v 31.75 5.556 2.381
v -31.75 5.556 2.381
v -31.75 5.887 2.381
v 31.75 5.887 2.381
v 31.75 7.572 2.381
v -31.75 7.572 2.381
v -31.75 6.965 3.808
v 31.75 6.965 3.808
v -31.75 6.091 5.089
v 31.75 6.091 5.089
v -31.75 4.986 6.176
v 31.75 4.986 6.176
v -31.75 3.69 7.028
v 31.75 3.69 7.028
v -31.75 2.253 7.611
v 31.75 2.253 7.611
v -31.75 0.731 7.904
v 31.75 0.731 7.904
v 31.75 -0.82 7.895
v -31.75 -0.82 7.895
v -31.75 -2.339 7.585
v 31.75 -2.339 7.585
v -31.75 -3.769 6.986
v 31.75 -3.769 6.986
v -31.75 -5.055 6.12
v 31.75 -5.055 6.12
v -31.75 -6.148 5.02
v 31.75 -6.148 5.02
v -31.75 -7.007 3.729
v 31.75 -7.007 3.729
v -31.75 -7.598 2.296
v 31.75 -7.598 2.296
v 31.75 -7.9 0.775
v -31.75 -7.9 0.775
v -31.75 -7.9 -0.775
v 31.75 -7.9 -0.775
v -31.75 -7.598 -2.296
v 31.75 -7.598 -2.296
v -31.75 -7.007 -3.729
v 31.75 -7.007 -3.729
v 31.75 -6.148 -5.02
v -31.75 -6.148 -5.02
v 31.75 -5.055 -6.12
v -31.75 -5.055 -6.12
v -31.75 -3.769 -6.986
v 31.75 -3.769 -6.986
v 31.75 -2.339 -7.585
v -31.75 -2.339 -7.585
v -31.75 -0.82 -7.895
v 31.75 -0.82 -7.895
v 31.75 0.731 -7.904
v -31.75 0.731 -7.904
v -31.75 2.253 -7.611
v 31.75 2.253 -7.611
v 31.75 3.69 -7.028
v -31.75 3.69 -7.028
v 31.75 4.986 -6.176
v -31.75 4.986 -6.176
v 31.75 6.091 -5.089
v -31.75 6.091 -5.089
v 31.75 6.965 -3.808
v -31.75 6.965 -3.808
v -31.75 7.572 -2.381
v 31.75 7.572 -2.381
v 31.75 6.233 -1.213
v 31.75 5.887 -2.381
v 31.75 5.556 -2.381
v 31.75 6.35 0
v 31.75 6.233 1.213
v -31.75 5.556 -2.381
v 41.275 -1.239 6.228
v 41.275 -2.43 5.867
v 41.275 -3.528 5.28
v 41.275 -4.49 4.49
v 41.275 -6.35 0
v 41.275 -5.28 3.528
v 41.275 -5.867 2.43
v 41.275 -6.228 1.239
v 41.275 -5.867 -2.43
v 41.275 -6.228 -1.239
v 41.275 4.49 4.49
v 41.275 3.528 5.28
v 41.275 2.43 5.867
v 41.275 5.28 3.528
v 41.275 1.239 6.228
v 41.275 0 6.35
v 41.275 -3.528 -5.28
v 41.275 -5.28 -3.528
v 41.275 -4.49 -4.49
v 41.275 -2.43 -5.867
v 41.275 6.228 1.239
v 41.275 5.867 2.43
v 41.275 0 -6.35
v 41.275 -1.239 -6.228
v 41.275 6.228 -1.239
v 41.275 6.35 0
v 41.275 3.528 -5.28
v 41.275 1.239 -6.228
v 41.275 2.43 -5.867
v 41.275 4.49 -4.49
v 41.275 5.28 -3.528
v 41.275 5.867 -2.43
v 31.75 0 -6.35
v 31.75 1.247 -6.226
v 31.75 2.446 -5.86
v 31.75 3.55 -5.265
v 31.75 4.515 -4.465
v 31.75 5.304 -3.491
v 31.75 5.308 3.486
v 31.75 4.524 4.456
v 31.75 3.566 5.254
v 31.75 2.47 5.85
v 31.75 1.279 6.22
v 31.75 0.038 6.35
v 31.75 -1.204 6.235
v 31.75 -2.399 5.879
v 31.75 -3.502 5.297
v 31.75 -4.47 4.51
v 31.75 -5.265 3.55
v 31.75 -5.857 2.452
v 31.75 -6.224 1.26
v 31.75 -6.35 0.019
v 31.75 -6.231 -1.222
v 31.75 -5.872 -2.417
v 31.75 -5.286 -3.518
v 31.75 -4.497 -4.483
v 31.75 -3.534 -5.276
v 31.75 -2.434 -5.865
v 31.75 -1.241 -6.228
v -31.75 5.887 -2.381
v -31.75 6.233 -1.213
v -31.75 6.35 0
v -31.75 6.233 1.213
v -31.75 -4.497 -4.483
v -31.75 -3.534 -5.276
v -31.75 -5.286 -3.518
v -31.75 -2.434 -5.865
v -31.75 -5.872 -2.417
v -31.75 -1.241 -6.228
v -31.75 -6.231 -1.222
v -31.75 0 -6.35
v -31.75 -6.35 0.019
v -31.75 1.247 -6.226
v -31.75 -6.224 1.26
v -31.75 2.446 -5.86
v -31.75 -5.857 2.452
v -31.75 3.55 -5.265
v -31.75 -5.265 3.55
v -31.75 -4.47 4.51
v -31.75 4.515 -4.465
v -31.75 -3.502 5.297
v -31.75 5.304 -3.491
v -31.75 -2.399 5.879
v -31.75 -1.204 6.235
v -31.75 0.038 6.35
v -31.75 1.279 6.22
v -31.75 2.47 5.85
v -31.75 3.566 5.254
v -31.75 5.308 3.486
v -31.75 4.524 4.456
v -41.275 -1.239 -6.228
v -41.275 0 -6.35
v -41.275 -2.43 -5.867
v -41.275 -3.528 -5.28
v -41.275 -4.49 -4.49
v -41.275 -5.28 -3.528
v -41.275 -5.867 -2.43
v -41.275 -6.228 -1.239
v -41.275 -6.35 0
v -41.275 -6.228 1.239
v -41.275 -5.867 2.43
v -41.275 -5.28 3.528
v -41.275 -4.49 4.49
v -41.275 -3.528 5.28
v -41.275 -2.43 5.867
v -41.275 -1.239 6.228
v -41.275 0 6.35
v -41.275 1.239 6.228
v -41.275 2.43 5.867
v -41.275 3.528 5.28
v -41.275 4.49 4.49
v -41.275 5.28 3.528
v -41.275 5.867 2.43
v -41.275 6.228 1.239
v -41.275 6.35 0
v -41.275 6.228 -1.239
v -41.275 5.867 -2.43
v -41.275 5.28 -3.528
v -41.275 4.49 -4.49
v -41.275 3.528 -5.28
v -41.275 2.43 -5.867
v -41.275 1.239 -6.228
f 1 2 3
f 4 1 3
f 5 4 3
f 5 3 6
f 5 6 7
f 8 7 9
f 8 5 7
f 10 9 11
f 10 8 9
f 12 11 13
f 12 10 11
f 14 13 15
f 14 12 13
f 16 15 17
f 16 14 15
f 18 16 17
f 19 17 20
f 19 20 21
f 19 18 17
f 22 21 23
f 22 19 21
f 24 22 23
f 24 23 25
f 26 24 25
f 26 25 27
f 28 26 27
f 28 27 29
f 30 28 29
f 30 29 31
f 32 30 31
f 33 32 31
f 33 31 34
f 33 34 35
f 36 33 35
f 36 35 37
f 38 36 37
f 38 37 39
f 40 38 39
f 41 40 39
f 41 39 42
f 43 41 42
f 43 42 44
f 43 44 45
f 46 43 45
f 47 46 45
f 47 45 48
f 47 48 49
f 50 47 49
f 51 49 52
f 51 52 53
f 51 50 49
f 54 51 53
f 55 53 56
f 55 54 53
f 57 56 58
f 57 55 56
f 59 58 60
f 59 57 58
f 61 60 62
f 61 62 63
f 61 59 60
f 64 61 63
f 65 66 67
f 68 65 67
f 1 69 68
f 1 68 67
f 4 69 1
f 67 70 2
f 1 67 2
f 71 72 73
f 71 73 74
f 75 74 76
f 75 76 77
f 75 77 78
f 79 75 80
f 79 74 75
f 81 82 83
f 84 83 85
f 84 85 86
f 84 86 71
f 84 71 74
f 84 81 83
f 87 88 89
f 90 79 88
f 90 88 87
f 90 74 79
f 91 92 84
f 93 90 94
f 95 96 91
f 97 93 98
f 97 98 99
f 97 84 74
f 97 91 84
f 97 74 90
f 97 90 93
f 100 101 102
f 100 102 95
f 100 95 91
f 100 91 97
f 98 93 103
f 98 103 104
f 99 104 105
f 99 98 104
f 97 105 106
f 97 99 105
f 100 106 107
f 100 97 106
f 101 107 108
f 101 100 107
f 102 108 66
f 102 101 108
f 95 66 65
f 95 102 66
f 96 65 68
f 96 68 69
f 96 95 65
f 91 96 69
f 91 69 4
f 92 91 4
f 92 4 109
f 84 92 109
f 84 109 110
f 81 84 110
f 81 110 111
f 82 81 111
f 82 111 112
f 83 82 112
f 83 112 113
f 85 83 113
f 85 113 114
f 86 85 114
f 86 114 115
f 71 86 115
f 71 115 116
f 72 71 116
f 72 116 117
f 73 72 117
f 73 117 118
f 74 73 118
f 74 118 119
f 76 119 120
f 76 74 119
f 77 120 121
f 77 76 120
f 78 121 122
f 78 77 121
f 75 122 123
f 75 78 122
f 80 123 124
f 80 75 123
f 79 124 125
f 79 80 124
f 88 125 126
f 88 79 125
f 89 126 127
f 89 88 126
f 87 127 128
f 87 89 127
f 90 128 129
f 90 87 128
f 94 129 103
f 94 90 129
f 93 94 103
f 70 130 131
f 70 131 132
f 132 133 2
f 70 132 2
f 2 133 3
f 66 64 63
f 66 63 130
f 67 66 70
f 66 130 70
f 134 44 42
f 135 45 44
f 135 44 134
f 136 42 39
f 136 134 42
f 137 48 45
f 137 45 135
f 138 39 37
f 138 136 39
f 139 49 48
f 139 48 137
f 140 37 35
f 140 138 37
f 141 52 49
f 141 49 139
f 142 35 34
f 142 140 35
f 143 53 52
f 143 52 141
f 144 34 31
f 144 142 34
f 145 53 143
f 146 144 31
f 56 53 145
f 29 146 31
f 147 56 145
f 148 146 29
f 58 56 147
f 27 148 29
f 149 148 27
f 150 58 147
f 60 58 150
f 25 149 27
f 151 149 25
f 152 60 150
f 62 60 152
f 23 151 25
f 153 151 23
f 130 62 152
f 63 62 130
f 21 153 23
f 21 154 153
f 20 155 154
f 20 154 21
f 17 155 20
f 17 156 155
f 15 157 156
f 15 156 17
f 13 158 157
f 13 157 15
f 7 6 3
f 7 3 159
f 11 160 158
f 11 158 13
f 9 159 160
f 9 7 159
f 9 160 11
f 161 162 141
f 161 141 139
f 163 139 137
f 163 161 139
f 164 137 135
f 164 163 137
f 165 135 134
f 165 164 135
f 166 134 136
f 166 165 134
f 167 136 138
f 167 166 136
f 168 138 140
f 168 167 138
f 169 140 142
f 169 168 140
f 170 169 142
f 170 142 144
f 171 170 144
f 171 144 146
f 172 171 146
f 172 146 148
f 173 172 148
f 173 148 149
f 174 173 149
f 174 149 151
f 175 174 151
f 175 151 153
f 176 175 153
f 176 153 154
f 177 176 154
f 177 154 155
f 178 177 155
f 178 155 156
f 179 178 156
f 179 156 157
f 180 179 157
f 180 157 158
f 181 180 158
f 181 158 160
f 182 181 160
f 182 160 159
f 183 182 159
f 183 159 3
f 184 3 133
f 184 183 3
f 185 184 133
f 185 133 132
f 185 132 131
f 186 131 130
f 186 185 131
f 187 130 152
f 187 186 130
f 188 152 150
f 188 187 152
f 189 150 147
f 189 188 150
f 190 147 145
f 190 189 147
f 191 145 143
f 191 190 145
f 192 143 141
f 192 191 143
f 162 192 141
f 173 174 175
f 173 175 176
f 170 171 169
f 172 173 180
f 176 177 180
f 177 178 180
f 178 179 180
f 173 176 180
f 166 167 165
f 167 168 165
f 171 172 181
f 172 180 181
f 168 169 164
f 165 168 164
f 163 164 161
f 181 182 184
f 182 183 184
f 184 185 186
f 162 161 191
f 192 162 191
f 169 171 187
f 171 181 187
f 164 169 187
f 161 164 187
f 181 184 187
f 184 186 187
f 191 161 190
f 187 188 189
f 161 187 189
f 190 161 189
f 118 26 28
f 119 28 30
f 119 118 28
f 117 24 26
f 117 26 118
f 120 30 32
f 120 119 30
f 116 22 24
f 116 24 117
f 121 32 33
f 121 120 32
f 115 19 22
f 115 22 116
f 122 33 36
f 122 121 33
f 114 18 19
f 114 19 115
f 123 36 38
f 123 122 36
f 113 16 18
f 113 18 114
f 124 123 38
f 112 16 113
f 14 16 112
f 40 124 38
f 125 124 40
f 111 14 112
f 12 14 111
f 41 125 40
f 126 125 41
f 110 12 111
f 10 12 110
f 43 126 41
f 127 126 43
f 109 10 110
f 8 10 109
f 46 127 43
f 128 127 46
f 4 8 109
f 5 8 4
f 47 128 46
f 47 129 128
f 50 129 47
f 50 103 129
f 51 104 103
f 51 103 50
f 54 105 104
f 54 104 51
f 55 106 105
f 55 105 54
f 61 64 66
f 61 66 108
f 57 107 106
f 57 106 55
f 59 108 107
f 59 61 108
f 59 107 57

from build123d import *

# Parameters (mm, degrees)
SKETCH1_R           = 7.9375
BOSS_EXTRUDE1_DEPTH = 41.275
SKETCH4_OUTSIDE_W   = 34.984
SKETCH4_OUTSIDE_H   = 34.984
SKETCH4_OUTSIDE_R   = 6.35
CUT_EXTRUDE1_DEPTH  = 9.525
SKETCH5_OUTSIDE_W   = 34.984
SKETCH5_OUTSIDE_H   = 34.984
SKETCH5_OUTSIDE_R   = 6.35
CUT_EXTRUDE2_DEPTH  = 9.525
CUT_EXTRUDE3_DEPTH  = 63.5


with BuildPart() as part:
    # Sketch1 → Boss-Extrude1 (new body, symmetric)
    with BuildSketch(Plane(origin=(0, 0, 0), x_dir=(0, 0, -1), z_dir=(1, 0, 0))):
        Circle(SKETCH1_R)
    extrude(amount=BOSS_EXTRUDE1_DEPTH, both=True)

    # Sketch4 outside → Cut-Extrude1 (cut)
    with BuildSketch(Plane(origin=(41.275, 0, 0), x_dir=(0, 0, -1), z_dir=(1, 0, 0))):
        Rectangle(SKETCH4_OUTSIDE_W, SKETCH4_OUTSIDE_H)
        Circle(SKETCH4_OUTSIDE_R, mode=Mode.SUBTRACT)
    extrude(amount=-CUT_EXTRUDE1_DEPTH, mode=Mode.SUBTRACT)

    # Sketch5 outside → Cut-Extrude2 (cut)
    with BuildSketch(Plane.ZY.offset(41.275)):
        Rectangle(SKETCH5_OUTSIDE_W, SKETCH5_OUTSIDE_H)
        with Locations(Location((0, 0, 0), (0, 0, 180))):  # turned: the seam where the file's is
            Circle(SKETCH5_OUTSIDE_R, mode=Mode.SUBTRACT)
    extrude(amount=-CUT_EXTRUDE2_DEPTH, mode=Mode.SUBTRACT)

    # Sketch7 → Cut-Extrude3 (cut)
    with BuildSketch(Plane.ZY.offset(31.75)):
        with BuildLine():
            Line((0, 5.55625), (2.38125, 5.55625))
            Line((2.38125, 5.55625), (2.38125, 7.571892411))
            ThreePointArc((2.38125, 7.571892411), (0, 7.9375), (-2.38125, 7.571892411))
            Line((-2.38125, 7.571892411), (-2.38125, 5.55625))
            Line((-2.38125, 5.55625), (0, 5.55625))
        make_face()
    extrude(amount=-CUT_EXTRUDE3_DEPTH, mode=Mode.SUBTRACT)


solid = part.part
